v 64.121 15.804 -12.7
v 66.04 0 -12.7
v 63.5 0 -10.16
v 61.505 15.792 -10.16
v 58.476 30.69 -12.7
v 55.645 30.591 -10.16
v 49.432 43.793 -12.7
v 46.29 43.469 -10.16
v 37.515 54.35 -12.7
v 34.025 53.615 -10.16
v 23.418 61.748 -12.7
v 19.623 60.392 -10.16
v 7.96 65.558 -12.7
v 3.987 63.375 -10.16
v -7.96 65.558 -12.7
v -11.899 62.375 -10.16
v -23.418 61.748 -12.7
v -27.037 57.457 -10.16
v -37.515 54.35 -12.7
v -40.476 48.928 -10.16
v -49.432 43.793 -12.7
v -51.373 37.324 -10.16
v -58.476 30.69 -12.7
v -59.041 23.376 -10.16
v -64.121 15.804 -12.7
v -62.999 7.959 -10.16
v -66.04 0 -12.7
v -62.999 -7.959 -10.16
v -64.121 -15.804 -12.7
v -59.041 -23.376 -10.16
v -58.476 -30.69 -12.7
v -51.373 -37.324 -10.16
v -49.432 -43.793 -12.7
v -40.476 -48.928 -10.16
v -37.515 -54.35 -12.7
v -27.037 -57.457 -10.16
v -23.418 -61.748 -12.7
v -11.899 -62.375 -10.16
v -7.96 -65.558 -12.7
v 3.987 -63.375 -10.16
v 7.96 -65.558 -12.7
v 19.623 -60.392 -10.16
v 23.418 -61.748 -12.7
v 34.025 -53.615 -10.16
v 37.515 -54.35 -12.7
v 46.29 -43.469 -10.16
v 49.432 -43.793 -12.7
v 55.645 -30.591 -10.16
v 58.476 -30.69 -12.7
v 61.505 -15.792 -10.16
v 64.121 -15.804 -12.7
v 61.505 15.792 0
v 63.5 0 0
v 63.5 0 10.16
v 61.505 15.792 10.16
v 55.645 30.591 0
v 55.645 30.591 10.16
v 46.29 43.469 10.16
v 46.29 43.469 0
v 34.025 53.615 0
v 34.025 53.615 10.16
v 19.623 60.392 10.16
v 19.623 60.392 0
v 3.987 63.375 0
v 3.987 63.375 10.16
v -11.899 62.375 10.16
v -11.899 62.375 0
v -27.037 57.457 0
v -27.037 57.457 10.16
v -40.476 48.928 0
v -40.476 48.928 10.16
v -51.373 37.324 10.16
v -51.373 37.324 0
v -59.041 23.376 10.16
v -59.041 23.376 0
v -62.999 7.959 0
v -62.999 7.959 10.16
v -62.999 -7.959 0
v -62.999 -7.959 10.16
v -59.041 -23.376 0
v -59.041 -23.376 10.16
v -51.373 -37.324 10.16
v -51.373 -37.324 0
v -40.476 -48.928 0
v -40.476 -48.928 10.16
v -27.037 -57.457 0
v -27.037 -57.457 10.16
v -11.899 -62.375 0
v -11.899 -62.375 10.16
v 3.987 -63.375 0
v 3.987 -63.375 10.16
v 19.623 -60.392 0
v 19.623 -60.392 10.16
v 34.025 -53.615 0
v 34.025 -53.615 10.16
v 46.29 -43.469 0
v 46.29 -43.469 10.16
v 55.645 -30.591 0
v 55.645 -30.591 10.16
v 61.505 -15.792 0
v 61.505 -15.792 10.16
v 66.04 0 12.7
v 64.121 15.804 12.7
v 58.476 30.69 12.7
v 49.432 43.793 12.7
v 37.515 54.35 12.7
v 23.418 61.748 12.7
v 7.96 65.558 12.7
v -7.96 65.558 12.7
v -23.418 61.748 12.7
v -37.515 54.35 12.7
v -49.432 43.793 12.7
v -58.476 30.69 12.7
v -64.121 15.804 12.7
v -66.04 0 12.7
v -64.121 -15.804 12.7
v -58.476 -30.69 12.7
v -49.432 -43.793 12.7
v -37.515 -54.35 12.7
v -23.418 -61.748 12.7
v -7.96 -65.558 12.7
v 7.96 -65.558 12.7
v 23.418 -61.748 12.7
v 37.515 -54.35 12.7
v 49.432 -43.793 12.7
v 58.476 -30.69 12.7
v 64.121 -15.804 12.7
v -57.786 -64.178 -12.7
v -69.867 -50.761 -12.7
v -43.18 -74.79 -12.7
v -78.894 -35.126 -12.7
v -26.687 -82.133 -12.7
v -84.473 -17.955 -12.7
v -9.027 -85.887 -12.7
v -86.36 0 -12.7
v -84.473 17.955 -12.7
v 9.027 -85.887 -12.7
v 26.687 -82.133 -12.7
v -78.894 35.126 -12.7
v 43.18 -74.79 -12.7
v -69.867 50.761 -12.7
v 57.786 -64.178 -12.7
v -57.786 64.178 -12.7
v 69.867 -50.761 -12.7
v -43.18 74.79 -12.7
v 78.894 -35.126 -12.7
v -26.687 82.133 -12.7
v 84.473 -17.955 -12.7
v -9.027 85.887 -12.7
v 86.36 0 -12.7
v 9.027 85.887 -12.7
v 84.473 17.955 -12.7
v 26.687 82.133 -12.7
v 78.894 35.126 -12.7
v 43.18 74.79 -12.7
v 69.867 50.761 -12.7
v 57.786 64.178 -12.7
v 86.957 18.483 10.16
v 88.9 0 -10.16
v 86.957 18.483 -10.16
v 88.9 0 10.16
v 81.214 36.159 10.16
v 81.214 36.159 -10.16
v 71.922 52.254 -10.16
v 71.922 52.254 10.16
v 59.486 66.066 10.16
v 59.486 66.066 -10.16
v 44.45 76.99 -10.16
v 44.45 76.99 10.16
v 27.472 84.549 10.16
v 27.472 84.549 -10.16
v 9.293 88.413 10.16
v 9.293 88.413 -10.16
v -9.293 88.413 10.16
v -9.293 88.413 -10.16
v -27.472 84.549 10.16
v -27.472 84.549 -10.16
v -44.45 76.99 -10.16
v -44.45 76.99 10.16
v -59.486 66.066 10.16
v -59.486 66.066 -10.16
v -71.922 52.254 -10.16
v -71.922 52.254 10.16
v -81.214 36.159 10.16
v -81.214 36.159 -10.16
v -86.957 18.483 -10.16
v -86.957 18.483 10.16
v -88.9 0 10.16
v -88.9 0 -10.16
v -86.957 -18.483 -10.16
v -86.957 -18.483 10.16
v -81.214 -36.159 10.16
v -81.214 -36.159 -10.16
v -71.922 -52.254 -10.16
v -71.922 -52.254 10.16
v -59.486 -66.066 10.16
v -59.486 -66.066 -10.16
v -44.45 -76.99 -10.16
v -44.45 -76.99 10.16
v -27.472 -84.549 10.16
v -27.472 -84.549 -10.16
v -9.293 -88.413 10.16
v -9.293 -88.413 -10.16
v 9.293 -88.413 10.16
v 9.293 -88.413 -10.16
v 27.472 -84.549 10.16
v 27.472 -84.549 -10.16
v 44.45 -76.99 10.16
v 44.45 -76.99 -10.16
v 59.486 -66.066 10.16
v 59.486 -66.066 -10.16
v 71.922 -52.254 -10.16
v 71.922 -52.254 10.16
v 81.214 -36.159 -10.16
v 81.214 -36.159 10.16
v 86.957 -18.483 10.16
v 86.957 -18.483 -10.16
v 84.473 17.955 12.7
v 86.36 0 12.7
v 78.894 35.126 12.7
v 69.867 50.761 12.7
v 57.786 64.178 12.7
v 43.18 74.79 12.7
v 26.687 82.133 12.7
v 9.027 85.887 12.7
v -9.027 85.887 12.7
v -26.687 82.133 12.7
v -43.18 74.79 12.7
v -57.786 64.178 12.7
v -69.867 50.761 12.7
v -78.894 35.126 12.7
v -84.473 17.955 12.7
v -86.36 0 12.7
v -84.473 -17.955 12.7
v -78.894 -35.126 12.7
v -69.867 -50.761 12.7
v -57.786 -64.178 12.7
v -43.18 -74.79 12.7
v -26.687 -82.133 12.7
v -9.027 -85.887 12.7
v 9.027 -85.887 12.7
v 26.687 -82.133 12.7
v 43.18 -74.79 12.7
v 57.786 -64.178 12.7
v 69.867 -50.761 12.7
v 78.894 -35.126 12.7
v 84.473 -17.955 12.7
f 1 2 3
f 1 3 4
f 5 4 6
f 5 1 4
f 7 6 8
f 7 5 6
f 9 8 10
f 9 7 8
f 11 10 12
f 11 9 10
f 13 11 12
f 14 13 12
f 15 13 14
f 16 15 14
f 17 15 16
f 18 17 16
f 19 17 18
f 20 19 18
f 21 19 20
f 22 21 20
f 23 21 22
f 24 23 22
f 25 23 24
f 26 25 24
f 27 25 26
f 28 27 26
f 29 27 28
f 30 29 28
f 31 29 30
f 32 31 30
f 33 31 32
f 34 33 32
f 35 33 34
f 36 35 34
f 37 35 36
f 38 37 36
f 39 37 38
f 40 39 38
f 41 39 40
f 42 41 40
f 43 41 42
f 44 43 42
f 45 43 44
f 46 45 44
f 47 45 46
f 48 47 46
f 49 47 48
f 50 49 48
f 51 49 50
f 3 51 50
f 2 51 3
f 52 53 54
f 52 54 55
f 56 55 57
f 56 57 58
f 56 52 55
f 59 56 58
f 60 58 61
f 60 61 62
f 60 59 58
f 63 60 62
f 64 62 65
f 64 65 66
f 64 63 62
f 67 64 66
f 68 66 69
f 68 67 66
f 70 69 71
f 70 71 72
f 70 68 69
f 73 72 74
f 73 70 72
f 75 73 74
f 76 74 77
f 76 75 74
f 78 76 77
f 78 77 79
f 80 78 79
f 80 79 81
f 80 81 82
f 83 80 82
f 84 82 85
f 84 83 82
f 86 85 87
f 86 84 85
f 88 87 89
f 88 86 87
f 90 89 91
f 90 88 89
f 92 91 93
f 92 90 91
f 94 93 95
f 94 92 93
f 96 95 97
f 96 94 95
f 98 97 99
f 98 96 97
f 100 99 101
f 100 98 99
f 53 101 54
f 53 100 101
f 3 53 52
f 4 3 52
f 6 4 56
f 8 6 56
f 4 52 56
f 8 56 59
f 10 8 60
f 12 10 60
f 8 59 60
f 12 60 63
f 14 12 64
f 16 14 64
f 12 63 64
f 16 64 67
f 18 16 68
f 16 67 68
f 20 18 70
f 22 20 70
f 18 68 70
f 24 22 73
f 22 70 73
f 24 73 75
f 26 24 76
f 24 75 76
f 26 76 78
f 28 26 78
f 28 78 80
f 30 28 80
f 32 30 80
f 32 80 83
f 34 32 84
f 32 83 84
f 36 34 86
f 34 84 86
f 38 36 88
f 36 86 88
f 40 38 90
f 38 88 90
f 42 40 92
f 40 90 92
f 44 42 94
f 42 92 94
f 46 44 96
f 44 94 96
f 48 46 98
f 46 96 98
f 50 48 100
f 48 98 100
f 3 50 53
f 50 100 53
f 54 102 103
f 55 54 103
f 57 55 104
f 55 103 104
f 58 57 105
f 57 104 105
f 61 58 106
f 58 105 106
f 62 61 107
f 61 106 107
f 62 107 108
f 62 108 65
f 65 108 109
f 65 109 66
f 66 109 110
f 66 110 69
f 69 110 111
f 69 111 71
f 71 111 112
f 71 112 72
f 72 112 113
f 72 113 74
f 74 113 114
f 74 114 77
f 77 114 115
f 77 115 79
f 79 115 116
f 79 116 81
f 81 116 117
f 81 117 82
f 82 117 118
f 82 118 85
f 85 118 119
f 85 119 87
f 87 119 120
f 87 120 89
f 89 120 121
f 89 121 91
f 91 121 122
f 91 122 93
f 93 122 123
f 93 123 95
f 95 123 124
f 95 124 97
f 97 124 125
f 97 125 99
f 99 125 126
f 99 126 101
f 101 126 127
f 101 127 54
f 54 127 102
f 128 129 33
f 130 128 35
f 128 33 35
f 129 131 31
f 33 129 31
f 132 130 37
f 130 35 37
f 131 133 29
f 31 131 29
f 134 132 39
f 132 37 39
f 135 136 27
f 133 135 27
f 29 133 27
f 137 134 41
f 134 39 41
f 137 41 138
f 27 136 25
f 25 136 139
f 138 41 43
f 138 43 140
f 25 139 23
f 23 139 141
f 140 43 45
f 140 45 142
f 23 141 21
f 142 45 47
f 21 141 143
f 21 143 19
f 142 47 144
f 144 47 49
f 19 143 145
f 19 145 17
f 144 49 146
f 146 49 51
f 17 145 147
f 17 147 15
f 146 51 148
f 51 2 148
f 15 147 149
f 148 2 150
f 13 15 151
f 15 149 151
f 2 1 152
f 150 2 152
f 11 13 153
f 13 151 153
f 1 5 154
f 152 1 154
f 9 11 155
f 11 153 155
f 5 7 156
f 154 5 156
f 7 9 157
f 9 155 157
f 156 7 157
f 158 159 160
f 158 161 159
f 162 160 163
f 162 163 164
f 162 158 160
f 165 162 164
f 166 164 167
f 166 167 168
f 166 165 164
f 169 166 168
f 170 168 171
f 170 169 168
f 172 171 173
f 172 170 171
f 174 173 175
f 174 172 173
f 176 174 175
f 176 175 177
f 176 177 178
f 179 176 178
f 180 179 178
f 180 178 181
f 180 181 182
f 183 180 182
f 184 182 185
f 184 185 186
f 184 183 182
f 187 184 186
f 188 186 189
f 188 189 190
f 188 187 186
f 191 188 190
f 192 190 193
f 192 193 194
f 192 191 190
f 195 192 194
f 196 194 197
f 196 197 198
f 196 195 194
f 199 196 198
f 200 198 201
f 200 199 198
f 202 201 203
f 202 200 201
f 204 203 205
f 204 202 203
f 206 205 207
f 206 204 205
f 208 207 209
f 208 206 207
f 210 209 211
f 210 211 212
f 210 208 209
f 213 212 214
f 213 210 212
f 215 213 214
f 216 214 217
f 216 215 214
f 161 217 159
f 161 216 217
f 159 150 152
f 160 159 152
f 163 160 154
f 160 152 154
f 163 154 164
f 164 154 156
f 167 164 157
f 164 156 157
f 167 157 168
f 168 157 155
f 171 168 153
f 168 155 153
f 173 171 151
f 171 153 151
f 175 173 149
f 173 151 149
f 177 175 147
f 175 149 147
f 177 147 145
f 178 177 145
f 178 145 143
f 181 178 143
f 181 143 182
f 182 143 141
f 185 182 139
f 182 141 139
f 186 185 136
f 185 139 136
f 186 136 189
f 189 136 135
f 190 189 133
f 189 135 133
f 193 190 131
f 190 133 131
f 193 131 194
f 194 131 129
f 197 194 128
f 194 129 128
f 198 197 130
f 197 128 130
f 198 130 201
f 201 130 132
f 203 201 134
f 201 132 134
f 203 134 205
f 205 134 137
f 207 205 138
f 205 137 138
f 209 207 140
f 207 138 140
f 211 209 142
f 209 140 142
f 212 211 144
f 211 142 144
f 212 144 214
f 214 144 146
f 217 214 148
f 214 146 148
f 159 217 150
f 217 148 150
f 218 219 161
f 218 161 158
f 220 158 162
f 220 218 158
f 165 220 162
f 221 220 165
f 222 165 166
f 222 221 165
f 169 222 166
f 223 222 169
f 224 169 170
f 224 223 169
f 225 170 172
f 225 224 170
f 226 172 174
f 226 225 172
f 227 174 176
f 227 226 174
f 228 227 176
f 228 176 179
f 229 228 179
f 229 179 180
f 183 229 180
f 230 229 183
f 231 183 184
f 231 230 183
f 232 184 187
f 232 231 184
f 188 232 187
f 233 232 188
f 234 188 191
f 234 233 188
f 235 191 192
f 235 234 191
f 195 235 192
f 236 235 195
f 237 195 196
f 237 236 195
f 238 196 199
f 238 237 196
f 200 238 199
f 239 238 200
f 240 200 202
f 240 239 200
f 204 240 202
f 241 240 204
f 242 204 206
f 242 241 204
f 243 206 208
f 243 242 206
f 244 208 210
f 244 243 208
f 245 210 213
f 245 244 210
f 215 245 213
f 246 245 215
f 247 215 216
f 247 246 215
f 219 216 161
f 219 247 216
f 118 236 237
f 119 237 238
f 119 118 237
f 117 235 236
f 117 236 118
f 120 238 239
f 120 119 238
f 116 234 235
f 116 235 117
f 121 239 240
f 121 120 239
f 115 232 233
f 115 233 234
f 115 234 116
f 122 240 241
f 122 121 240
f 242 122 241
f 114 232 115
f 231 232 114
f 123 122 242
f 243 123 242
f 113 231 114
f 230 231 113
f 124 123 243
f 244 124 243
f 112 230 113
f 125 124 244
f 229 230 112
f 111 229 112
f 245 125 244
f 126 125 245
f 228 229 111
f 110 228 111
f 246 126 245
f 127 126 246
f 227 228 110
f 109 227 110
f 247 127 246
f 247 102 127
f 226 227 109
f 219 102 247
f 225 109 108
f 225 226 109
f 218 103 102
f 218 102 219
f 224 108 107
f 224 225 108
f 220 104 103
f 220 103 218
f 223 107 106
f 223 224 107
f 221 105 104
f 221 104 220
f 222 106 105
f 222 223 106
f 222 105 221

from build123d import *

# Parameters (mm, degrees)
F0_R     = 88.9
F0_R_2   = 63.5
F1_DEPTH = 12.7
F2_SIZE  = 2.54


with BuildPart() as f1:
    # F0 (on Top) → F1 (new body)
    with BuildSketch(Plane.XY):
        Circle(F0_R)
        Circle(F0_R_2, mode=Mode.SUBTRACT)
    extrude(amount=F1_DEPTH)

    # F2
    f2_edges = [f1.edges().sort_by_distance(p)[0] for p in [
        (-88.9, 0, 12.7),
        (-63.5, 0, 12.7),
    ]]
    chamfer(f2_edges, length=F2_SIZE)

    # F3: F1 across face


with BuildPart() as f1_1:
    add(f1.part)
    add(f1.part.mirror(Plane(origin=(0, 0, 0), x_dir=(1, 0, 0), z_dir=(0, 0, -1))))


solid = f1_1.part
